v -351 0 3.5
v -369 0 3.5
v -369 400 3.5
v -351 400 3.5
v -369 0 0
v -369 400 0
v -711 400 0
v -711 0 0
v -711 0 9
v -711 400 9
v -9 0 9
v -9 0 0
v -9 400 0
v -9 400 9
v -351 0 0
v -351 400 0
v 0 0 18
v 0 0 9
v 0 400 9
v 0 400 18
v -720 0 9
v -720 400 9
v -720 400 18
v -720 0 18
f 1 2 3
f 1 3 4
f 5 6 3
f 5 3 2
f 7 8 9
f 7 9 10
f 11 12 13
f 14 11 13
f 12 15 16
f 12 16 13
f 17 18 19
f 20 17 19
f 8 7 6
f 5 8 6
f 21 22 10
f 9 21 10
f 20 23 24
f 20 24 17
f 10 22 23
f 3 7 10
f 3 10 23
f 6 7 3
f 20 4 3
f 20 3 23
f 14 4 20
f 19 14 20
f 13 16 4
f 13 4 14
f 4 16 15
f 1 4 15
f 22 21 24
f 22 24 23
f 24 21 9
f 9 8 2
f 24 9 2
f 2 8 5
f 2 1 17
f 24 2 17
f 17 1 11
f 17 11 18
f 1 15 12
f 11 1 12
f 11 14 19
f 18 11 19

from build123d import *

# Parameters (mm, degrees)
SKETCH_W        = 720
SKETCH_H        = 400
PAD_DEPTH       = 18
SKETCH001_W     = 9
SKETCH001_H     = 400
POCKET_DEPTH    = 9
SKETCH002_W     = 18
SKETCH002_H     = 400
POCKET001_DEPTH = 3.5


with BuildPart() as part:
    # Sketch → Pad (new body)
    with BuildSketch(Plane.XY):
        with Locations((-360, 200)):
            Rectangle(SKETCH_W, SKETCH_H)
    extrude(amount=PAD_DEPTH)

    # Sketch001 → Pocket (cut)
    with BuildSketch(Plane.XY):
        with Locations((-4.5, 200)):
            Rectangle(SKETCH001_W, SKETCH001_H)
        with Locations((-715.5, 200)):
            Rectangle(SKETCH001_W, SKETCH001_H)
    extrude(amount=POCKET_DEPTH, mode=Mode.SUBTRACT)

    # Sketch002 (on Face4 of Pocket) → Pocket001 (cut)
    with BuildSketch(Plane(origin=(0, 0, 0), x_dir=(1, 0, 0), z_dir=(0, 0, -1))):
        with Locations((-360, -200)):
            Rectangle(SKETCH002_W, SKETCH002_H)
    extrude(amount=-POCKET001_DEPTH, mode=Mode.SUBTRACT)


solid = part.part
